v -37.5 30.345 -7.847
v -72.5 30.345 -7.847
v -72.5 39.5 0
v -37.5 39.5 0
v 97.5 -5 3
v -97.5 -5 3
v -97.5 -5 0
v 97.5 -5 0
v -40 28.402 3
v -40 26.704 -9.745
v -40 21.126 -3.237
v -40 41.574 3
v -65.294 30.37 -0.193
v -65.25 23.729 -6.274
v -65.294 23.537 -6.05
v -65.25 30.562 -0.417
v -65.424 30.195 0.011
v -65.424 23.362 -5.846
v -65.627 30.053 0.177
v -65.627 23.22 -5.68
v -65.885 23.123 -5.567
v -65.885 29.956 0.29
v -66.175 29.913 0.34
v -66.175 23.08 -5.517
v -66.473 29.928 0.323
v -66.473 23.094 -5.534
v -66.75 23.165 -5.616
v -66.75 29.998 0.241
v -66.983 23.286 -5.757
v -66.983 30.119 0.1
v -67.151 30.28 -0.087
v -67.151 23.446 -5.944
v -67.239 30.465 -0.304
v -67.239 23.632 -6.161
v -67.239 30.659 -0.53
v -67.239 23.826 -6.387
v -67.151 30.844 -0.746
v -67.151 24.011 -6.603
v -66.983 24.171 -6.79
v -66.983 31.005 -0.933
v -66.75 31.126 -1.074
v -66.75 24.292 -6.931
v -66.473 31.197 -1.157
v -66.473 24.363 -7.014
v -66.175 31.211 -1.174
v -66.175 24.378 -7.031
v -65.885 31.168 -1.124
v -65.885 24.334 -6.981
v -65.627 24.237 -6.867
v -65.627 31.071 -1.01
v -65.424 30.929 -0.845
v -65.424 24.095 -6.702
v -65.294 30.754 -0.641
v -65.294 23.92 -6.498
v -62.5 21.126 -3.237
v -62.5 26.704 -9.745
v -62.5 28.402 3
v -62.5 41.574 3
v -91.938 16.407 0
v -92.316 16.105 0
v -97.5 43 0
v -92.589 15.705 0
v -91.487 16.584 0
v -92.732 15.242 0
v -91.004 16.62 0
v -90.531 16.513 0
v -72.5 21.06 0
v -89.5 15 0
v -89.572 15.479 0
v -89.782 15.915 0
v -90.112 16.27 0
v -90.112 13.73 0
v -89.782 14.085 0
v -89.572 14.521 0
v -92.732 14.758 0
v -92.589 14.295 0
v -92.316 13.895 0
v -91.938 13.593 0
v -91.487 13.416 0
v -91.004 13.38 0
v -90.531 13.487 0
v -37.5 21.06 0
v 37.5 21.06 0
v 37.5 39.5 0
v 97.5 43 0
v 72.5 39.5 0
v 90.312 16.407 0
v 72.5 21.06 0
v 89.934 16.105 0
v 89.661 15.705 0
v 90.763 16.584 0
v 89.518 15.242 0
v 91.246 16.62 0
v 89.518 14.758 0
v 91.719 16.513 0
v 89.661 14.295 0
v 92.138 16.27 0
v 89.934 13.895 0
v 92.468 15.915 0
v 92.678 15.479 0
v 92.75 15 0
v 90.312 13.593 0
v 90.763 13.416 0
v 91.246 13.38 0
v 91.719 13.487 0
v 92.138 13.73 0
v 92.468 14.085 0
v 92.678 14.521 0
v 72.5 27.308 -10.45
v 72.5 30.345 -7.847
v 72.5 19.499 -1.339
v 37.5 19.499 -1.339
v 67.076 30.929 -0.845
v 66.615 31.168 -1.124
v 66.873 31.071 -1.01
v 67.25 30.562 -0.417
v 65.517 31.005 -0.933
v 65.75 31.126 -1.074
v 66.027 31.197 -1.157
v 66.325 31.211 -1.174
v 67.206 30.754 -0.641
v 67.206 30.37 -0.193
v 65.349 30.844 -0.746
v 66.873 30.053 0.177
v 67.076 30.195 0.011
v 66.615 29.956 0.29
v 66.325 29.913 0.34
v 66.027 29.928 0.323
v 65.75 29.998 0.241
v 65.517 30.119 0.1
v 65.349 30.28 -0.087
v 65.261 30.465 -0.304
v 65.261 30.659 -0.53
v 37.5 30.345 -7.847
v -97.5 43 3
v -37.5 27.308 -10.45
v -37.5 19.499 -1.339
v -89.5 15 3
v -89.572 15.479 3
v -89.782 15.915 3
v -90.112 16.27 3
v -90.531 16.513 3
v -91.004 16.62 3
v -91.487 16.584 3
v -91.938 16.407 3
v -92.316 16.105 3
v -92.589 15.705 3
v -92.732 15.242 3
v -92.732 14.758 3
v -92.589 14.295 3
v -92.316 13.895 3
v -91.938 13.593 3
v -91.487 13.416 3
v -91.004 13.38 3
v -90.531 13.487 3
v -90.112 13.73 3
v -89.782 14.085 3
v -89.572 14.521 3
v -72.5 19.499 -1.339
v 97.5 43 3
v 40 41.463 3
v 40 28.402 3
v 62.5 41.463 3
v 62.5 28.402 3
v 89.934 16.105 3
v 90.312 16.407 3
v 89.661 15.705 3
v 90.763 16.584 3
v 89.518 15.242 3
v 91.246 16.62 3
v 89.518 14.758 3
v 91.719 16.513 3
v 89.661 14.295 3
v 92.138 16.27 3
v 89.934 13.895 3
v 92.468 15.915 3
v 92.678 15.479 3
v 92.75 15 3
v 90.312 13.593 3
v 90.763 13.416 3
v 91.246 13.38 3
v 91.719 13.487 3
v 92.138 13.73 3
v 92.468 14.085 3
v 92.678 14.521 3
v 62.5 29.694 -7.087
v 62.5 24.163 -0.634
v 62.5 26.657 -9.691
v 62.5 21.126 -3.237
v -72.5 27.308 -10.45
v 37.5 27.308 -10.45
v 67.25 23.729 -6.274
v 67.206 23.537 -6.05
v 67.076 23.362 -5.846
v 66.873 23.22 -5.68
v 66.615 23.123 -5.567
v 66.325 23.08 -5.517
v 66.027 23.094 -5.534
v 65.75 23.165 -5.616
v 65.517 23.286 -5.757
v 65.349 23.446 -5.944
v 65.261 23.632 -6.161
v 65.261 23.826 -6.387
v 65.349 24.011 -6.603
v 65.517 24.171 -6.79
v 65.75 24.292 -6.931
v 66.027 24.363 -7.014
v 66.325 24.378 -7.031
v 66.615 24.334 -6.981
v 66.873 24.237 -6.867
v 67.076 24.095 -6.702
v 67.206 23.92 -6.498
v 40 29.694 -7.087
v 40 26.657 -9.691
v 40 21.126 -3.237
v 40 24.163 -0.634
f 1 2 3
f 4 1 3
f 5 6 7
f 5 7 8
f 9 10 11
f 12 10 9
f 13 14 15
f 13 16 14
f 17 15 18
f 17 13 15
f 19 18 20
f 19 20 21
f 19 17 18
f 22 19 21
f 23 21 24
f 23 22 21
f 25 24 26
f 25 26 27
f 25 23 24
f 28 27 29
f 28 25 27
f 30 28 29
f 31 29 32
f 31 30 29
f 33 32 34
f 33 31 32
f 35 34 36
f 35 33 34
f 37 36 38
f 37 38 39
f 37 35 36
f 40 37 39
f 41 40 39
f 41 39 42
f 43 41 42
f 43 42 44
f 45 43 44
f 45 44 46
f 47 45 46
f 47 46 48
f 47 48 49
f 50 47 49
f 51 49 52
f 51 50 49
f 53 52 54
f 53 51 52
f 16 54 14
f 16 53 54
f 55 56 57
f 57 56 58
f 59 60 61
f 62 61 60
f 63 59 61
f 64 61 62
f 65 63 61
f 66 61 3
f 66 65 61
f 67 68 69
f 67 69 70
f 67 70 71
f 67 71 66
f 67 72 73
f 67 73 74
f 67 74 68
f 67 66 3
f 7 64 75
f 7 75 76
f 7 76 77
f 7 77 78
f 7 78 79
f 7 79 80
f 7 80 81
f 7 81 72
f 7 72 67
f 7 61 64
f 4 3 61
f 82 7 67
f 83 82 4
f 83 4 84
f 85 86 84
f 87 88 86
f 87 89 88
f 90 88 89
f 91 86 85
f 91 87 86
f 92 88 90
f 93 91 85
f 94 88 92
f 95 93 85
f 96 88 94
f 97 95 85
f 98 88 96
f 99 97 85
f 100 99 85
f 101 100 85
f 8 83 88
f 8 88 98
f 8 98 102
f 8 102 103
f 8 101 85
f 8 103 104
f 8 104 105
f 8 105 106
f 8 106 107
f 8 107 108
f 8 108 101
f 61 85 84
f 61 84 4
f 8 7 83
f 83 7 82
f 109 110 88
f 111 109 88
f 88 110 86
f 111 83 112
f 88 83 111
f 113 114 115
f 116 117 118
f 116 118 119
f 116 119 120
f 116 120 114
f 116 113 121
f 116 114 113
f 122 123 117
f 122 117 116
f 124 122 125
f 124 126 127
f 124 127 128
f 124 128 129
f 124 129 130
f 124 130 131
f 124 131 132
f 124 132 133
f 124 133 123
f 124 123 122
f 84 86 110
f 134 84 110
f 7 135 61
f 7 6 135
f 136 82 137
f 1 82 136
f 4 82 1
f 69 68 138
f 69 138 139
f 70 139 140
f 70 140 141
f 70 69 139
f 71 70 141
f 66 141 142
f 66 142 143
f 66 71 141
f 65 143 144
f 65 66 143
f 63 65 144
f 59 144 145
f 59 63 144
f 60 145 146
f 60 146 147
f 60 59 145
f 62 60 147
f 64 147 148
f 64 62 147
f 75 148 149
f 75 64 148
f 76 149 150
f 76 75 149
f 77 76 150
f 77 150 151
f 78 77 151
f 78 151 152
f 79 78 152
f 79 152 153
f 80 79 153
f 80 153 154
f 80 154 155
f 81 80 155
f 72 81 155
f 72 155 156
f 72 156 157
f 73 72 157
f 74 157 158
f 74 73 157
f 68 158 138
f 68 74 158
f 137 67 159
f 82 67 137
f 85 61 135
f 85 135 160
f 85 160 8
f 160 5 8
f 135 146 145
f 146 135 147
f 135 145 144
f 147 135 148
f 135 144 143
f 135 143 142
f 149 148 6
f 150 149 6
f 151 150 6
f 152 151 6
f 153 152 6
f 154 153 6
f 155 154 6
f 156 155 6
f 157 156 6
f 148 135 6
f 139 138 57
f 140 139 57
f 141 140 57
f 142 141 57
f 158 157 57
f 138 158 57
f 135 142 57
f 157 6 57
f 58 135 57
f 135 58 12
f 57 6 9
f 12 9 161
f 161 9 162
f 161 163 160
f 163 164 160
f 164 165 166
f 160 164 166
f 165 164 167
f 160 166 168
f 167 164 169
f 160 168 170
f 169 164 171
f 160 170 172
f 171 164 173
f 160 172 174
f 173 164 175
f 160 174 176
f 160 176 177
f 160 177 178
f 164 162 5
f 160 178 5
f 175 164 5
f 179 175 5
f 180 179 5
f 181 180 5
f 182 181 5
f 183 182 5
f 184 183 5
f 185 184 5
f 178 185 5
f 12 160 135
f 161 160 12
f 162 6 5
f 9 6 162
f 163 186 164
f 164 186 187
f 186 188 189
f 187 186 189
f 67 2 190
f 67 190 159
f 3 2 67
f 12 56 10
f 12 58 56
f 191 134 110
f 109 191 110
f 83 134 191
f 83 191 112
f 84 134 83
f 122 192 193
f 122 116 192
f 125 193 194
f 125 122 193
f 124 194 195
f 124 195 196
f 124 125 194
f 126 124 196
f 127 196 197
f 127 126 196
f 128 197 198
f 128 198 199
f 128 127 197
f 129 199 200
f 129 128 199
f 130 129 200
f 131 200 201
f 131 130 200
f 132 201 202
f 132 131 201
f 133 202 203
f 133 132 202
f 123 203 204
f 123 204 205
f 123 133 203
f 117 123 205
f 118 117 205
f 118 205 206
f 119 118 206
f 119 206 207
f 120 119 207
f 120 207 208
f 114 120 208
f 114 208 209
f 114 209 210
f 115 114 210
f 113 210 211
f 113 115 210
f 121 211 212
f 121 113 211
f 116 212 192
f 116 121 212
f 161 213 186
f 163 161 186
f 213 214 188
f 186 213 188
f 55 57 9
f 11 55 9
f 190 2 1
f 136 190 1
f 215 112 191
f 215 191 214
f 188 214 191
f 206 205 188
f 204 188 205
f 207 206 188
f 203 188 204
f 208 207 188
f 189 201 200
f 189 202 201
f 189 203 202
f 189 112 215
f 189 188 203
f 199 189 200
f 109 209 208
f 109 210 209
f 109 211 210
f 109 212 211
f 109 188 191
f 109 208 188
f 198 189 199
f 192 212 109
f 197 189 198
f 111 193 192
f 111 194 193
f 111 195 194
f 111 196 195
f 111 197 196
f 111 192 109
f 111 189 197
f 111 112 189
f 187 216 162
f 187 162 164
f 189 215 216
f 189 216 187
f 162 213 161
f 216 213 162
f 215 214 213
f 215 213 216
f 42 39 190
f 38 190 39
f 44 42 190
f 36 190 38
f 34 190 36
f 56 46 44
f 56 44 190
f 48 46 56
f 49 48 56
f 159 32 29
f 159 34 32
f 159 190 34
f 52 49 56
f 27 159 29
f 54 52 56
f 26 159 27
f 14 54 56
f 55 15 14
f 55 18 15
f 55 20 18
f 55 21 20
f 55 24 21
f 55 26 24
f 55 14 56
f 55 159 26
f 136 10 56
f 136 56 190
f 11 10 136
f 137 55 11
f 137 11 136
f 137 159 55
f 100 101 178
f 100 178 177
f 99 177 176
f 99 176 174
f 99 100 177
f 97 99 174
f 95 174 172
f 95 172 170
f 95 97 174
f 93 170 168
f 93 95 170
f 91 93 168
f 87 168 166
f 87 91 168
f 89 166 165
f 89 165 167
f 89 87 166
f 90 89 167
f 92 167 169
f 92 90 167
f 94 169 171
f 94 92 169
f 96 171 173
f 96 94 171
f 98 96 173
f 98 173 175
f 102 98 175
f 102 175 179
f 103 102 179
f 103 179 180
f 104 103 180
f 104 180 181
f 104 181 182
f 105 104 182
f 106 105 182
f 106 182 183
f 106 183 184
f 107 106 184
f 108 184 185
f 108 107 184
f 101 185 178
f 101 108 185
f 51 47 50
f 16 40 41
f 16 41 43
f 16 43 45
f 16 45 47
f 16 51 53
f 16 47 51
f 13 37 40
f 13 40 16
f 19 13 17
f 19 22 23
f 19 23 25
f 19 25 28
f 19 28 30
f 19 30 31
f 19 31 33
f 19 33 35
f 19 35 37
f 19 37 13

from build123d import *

# Parameters (mm, degrees)
CROQUIS1_W                 = 195
CROQUIS1_H                 = 38
CROQUIS1_R                 = 1.625
SALIENTE_EXTRUIR1_DEPTH    = 3
CROQUIS8_W                 = 195
CROQUIS8_H                 = 3
SALIENTE_EXTRUIR5_DEPTH    = 5
CROQUIS9_W                 = 195
CROQUIS9_H                 = 3
SALIENTE_EXTRUIR6_DEPTH    = 5
SALIENTE_EXTRUIR7_START    = -25
SALIENTE_EXTRUIR7_DEPTH    = 35
CROQUIS11_W                = 22.5
CROQUIS11_H                = 8.5
CORTAR_EXTRUIR4_DEPTH      = 24.953943013
CORTAR_EXTRUIR4_DEPTH_BACK = 22.667360251
CORTAR_EXTRUIR5_REACH      = 172
CROQUIS13_R                = 1
CORTAR_EXTRUIR6_DEPTH      = 5
SALIENTE_EXTRUIR8_START    = -25
SALIENTE_EXTRUIR8_DEPTH    = 35
CROQUIS16_W                = 22.5
CROQUIS16_H                = 8.572274099
CORTAR_EXTRUIR7_DEPTH      = 27.836407603
CORTAR_EXTRUIR7_DEPTH_BACK = 17.667360251
CROQUIS17_R                = 1
CORTAR_EXTRUIR8_DEPTH      = 5
CROQUIS18_W                = 35
CROQUIS18_H                = 12
CROQUIS18_R                = 1
CROQUIS18_W_2              = 22.5
CROQUIS18_H_2              = 8.572274099
CROQUIS18_H_3              = 8.5
SALIENTE_EXTRUIR9_DEPTH    = 4


with BuildPart() as part:
    # Croquis1 → Saliente-Extruir1 (new body)
    with BuildSketch(Plane.XY):
        with Locations((0, 19)):
            Rectangle(CROQUIS1_W, CROQUIS1_H)
        with Locations((91.125, 15)):
            Circle(CROQUIS1_R, mode=Mode.SUBTRACT)
        with Locations((-91.125, 15)):
            Circle(CROQUIS1_R, mode=Mode.SUBTRACT)
    extrude(amount=SALIENTE_EXTRUIR1_DEPTH)

    # Croquis8 → Saliente-Extruir5 (add)
    with BuildSketch(Plane.XZ):
        with Locations((0, 1.5)):
            Rectangle(CROQUIS8_W, CROQUIS8_H)
    extrude(amount=SALIENTE_EXTRUIR5_DEPTH)

    # Croquis9 → Saliente-Extruir6 (add)
    with BuildSketch(Plane(origin=(0, 38, 0), x_dir=(1, 0, 0), z_dir=(0, 1, 0))):
        with Locations((0, -1.5)):
            Rectangle(CROQUIS9_W, CROQUIS9_H)
    extrude(amount=SALIENTE_EXTRUIR6_DEPTH)

    # Croquis10 → Saliente-Extruir7 (add)
    with BuildSketch(Plane(origin=(97.5, 0, 0), x_dir=(0, 0, -1), z_dir=(1, 0, 0)).offset(SALIENTE_EXTRUIR7_START)):
        Polygon((0, 39.499839942), (11.100559408, 26.548595056), (1.230032412, 18.088530231), (0, 17.034264947), align=None)
    extrude(amount=-SALIENTE_EXTRUIR7_DEPTH)

    # Croquis11 → Cortar-Extruir4 (cut, two sides)
    with BuildSketch(Plane(origin=(0, 9.820133108, 8.416872039), x_dir=(1, 0, 0), z_dir=(0, -0.759271307, -0.650774217))) as cortar_extruir4_sk:
        with Locations((51.25, -20.45547742)):
            Rectangle(CROQUIS11_W, CROQUIS11_H)
    extrude(amount=CORTAR_EXTRUIR4_DEPTH, mode=Mode.SUBTRACT)
    extrude(cortar_extruir4_sk.sketch, amount=-CORTAR_EXTRUIR4_DEPTH_BACK, mode=Mode.SUBTRACT)

    # Croquis12 → Cortar-Extruir5 (cut, up to next)
    with BuildSketch(Plane(origin=(72.5, 0, 0), x_dir=(0, 0, -1), z_dir=(1, 0, 0)), mode=Mode.PRIVATE) as cortar_extruir5_sk1:
        Polygon((11.100559408, 26.548595056), (0, 17.034264947), (0, 23.619526305), (7.846688321, 30.344951592), align=None)
    cortar_extruir5_tool1 = extrude(cortar_extruir5_sk1.sketch, amount=-CORTAR_EXTRUIR5_REACH, mode=Mode.PRIVATE) & part.part
    add(cortar_extruir5_tool1.solids().sort_by_distance((72.5, 24.238262, -4.783378))[0], mode=Mode.SUBTRACT)

    # Croquis13 → Cortar-Extruir6 (cut)
    with BuildSketch(Plane(origin=(0, 13.616489645, 11.670743125), x_dir=(1, 0, 0), z_dir=(0, -0.759271307, -0.650774217))):
        with Locations((66.25, -20.20547742)):
            Circle(CROQUIS13_R)
    extrude(amount=-CORTAR_EXTRUIR6_DEPTH, mode=Mode.SUBTRACT)

    # Croquis14 → Saliente-Extruir8 (add)
    with BuildSketch(Plane.ZY.offset(97.5).offset(SALIENTE_EXTRUIR8_START)):
        Polygon((0, 23.619526305), (-7.846688321, 30.344951592), (0, 39.499839942), align=None)
    extrude(amount=-SALIENTE_EXTRUIR8_DEPTH)

    # Croquis16 → Cortar-Extruir7 (cut, two sides)
    with BuildSketch(Plane(origin=(0, 13.616489645, 11.670743125), x_dir=(1, 0, 0), z_dir=(0, -0.759271307, -0.650774217))) as cortar_extruir7_sk:
        with Locations((-51.25, -20.491614469)):
            Rectangle(CROQUIS16_W, CROQUIS16_H)
    extrude(amount=CORTAR_EXTRUIR7_DEPTH, mode=Mode.SUBTRACT)
    extrude(cortar_extruir7_sk.sketch, amount=-CORTAR_EXTRUIR7_DEPTH_BACK, mode=Mode.SUBTRACT)

    # Croquis17 → Cortar-Extruir8 (cut)
    with BuildSketch(Plane(origin=(0, 13.616489645, 11.670743125), x_dir=(1, 0, 0), z_dir=(0, -0.759271307, -0.650774217))):
        with Locations((-66.25, -20.20547742)):
            Circle(CROQUIS17_R)
    extrude(amount=-CORTAR_EXTRUIR8_DEPTH, mode=Mode.SUBTRACT)

    # Croquis18 → Saliente-Extruir9 (add)
    with BuildSketch(Plane(origin=(0, 13.616489645, 11.670743125), x_dir=(1, 0, 0), z_dir=(0, -0.759271307, -0.650774217))):
        with Locations((-55, -19.70547742)):
            Rectangle(CROQUIS18_W, CROQUIS18_H)
        with Locations((-66.25, -20.20547742)):
            Circle(CROQUIS18_R, mode=Mode.SUBTRACT)
        with Locations((-51.25, -20.491614469)):
            Rectangle(CROQUIS18_W_2, CROQUIS18_H_2, mode=Mode.SUBTRACT)
        with Locations((55, -19.70547742)):
            Rectangle(CROQUIS18_W, CROQUIS18_H)
        with Locations((66.25, -20.20547742)):
            Circle(CROQUIS18_R, mode=Mode.SUBTRACT)
        with Locations((51.25, -20.45547742)):
            Rectangle(CROQUIS18_W_2, CROQUIS18_H_3, mode=Mode.SUBTRACT)
    extrude(amount=SALIENTE_EXTRUIR9_DEPTH)


solid = part.part
